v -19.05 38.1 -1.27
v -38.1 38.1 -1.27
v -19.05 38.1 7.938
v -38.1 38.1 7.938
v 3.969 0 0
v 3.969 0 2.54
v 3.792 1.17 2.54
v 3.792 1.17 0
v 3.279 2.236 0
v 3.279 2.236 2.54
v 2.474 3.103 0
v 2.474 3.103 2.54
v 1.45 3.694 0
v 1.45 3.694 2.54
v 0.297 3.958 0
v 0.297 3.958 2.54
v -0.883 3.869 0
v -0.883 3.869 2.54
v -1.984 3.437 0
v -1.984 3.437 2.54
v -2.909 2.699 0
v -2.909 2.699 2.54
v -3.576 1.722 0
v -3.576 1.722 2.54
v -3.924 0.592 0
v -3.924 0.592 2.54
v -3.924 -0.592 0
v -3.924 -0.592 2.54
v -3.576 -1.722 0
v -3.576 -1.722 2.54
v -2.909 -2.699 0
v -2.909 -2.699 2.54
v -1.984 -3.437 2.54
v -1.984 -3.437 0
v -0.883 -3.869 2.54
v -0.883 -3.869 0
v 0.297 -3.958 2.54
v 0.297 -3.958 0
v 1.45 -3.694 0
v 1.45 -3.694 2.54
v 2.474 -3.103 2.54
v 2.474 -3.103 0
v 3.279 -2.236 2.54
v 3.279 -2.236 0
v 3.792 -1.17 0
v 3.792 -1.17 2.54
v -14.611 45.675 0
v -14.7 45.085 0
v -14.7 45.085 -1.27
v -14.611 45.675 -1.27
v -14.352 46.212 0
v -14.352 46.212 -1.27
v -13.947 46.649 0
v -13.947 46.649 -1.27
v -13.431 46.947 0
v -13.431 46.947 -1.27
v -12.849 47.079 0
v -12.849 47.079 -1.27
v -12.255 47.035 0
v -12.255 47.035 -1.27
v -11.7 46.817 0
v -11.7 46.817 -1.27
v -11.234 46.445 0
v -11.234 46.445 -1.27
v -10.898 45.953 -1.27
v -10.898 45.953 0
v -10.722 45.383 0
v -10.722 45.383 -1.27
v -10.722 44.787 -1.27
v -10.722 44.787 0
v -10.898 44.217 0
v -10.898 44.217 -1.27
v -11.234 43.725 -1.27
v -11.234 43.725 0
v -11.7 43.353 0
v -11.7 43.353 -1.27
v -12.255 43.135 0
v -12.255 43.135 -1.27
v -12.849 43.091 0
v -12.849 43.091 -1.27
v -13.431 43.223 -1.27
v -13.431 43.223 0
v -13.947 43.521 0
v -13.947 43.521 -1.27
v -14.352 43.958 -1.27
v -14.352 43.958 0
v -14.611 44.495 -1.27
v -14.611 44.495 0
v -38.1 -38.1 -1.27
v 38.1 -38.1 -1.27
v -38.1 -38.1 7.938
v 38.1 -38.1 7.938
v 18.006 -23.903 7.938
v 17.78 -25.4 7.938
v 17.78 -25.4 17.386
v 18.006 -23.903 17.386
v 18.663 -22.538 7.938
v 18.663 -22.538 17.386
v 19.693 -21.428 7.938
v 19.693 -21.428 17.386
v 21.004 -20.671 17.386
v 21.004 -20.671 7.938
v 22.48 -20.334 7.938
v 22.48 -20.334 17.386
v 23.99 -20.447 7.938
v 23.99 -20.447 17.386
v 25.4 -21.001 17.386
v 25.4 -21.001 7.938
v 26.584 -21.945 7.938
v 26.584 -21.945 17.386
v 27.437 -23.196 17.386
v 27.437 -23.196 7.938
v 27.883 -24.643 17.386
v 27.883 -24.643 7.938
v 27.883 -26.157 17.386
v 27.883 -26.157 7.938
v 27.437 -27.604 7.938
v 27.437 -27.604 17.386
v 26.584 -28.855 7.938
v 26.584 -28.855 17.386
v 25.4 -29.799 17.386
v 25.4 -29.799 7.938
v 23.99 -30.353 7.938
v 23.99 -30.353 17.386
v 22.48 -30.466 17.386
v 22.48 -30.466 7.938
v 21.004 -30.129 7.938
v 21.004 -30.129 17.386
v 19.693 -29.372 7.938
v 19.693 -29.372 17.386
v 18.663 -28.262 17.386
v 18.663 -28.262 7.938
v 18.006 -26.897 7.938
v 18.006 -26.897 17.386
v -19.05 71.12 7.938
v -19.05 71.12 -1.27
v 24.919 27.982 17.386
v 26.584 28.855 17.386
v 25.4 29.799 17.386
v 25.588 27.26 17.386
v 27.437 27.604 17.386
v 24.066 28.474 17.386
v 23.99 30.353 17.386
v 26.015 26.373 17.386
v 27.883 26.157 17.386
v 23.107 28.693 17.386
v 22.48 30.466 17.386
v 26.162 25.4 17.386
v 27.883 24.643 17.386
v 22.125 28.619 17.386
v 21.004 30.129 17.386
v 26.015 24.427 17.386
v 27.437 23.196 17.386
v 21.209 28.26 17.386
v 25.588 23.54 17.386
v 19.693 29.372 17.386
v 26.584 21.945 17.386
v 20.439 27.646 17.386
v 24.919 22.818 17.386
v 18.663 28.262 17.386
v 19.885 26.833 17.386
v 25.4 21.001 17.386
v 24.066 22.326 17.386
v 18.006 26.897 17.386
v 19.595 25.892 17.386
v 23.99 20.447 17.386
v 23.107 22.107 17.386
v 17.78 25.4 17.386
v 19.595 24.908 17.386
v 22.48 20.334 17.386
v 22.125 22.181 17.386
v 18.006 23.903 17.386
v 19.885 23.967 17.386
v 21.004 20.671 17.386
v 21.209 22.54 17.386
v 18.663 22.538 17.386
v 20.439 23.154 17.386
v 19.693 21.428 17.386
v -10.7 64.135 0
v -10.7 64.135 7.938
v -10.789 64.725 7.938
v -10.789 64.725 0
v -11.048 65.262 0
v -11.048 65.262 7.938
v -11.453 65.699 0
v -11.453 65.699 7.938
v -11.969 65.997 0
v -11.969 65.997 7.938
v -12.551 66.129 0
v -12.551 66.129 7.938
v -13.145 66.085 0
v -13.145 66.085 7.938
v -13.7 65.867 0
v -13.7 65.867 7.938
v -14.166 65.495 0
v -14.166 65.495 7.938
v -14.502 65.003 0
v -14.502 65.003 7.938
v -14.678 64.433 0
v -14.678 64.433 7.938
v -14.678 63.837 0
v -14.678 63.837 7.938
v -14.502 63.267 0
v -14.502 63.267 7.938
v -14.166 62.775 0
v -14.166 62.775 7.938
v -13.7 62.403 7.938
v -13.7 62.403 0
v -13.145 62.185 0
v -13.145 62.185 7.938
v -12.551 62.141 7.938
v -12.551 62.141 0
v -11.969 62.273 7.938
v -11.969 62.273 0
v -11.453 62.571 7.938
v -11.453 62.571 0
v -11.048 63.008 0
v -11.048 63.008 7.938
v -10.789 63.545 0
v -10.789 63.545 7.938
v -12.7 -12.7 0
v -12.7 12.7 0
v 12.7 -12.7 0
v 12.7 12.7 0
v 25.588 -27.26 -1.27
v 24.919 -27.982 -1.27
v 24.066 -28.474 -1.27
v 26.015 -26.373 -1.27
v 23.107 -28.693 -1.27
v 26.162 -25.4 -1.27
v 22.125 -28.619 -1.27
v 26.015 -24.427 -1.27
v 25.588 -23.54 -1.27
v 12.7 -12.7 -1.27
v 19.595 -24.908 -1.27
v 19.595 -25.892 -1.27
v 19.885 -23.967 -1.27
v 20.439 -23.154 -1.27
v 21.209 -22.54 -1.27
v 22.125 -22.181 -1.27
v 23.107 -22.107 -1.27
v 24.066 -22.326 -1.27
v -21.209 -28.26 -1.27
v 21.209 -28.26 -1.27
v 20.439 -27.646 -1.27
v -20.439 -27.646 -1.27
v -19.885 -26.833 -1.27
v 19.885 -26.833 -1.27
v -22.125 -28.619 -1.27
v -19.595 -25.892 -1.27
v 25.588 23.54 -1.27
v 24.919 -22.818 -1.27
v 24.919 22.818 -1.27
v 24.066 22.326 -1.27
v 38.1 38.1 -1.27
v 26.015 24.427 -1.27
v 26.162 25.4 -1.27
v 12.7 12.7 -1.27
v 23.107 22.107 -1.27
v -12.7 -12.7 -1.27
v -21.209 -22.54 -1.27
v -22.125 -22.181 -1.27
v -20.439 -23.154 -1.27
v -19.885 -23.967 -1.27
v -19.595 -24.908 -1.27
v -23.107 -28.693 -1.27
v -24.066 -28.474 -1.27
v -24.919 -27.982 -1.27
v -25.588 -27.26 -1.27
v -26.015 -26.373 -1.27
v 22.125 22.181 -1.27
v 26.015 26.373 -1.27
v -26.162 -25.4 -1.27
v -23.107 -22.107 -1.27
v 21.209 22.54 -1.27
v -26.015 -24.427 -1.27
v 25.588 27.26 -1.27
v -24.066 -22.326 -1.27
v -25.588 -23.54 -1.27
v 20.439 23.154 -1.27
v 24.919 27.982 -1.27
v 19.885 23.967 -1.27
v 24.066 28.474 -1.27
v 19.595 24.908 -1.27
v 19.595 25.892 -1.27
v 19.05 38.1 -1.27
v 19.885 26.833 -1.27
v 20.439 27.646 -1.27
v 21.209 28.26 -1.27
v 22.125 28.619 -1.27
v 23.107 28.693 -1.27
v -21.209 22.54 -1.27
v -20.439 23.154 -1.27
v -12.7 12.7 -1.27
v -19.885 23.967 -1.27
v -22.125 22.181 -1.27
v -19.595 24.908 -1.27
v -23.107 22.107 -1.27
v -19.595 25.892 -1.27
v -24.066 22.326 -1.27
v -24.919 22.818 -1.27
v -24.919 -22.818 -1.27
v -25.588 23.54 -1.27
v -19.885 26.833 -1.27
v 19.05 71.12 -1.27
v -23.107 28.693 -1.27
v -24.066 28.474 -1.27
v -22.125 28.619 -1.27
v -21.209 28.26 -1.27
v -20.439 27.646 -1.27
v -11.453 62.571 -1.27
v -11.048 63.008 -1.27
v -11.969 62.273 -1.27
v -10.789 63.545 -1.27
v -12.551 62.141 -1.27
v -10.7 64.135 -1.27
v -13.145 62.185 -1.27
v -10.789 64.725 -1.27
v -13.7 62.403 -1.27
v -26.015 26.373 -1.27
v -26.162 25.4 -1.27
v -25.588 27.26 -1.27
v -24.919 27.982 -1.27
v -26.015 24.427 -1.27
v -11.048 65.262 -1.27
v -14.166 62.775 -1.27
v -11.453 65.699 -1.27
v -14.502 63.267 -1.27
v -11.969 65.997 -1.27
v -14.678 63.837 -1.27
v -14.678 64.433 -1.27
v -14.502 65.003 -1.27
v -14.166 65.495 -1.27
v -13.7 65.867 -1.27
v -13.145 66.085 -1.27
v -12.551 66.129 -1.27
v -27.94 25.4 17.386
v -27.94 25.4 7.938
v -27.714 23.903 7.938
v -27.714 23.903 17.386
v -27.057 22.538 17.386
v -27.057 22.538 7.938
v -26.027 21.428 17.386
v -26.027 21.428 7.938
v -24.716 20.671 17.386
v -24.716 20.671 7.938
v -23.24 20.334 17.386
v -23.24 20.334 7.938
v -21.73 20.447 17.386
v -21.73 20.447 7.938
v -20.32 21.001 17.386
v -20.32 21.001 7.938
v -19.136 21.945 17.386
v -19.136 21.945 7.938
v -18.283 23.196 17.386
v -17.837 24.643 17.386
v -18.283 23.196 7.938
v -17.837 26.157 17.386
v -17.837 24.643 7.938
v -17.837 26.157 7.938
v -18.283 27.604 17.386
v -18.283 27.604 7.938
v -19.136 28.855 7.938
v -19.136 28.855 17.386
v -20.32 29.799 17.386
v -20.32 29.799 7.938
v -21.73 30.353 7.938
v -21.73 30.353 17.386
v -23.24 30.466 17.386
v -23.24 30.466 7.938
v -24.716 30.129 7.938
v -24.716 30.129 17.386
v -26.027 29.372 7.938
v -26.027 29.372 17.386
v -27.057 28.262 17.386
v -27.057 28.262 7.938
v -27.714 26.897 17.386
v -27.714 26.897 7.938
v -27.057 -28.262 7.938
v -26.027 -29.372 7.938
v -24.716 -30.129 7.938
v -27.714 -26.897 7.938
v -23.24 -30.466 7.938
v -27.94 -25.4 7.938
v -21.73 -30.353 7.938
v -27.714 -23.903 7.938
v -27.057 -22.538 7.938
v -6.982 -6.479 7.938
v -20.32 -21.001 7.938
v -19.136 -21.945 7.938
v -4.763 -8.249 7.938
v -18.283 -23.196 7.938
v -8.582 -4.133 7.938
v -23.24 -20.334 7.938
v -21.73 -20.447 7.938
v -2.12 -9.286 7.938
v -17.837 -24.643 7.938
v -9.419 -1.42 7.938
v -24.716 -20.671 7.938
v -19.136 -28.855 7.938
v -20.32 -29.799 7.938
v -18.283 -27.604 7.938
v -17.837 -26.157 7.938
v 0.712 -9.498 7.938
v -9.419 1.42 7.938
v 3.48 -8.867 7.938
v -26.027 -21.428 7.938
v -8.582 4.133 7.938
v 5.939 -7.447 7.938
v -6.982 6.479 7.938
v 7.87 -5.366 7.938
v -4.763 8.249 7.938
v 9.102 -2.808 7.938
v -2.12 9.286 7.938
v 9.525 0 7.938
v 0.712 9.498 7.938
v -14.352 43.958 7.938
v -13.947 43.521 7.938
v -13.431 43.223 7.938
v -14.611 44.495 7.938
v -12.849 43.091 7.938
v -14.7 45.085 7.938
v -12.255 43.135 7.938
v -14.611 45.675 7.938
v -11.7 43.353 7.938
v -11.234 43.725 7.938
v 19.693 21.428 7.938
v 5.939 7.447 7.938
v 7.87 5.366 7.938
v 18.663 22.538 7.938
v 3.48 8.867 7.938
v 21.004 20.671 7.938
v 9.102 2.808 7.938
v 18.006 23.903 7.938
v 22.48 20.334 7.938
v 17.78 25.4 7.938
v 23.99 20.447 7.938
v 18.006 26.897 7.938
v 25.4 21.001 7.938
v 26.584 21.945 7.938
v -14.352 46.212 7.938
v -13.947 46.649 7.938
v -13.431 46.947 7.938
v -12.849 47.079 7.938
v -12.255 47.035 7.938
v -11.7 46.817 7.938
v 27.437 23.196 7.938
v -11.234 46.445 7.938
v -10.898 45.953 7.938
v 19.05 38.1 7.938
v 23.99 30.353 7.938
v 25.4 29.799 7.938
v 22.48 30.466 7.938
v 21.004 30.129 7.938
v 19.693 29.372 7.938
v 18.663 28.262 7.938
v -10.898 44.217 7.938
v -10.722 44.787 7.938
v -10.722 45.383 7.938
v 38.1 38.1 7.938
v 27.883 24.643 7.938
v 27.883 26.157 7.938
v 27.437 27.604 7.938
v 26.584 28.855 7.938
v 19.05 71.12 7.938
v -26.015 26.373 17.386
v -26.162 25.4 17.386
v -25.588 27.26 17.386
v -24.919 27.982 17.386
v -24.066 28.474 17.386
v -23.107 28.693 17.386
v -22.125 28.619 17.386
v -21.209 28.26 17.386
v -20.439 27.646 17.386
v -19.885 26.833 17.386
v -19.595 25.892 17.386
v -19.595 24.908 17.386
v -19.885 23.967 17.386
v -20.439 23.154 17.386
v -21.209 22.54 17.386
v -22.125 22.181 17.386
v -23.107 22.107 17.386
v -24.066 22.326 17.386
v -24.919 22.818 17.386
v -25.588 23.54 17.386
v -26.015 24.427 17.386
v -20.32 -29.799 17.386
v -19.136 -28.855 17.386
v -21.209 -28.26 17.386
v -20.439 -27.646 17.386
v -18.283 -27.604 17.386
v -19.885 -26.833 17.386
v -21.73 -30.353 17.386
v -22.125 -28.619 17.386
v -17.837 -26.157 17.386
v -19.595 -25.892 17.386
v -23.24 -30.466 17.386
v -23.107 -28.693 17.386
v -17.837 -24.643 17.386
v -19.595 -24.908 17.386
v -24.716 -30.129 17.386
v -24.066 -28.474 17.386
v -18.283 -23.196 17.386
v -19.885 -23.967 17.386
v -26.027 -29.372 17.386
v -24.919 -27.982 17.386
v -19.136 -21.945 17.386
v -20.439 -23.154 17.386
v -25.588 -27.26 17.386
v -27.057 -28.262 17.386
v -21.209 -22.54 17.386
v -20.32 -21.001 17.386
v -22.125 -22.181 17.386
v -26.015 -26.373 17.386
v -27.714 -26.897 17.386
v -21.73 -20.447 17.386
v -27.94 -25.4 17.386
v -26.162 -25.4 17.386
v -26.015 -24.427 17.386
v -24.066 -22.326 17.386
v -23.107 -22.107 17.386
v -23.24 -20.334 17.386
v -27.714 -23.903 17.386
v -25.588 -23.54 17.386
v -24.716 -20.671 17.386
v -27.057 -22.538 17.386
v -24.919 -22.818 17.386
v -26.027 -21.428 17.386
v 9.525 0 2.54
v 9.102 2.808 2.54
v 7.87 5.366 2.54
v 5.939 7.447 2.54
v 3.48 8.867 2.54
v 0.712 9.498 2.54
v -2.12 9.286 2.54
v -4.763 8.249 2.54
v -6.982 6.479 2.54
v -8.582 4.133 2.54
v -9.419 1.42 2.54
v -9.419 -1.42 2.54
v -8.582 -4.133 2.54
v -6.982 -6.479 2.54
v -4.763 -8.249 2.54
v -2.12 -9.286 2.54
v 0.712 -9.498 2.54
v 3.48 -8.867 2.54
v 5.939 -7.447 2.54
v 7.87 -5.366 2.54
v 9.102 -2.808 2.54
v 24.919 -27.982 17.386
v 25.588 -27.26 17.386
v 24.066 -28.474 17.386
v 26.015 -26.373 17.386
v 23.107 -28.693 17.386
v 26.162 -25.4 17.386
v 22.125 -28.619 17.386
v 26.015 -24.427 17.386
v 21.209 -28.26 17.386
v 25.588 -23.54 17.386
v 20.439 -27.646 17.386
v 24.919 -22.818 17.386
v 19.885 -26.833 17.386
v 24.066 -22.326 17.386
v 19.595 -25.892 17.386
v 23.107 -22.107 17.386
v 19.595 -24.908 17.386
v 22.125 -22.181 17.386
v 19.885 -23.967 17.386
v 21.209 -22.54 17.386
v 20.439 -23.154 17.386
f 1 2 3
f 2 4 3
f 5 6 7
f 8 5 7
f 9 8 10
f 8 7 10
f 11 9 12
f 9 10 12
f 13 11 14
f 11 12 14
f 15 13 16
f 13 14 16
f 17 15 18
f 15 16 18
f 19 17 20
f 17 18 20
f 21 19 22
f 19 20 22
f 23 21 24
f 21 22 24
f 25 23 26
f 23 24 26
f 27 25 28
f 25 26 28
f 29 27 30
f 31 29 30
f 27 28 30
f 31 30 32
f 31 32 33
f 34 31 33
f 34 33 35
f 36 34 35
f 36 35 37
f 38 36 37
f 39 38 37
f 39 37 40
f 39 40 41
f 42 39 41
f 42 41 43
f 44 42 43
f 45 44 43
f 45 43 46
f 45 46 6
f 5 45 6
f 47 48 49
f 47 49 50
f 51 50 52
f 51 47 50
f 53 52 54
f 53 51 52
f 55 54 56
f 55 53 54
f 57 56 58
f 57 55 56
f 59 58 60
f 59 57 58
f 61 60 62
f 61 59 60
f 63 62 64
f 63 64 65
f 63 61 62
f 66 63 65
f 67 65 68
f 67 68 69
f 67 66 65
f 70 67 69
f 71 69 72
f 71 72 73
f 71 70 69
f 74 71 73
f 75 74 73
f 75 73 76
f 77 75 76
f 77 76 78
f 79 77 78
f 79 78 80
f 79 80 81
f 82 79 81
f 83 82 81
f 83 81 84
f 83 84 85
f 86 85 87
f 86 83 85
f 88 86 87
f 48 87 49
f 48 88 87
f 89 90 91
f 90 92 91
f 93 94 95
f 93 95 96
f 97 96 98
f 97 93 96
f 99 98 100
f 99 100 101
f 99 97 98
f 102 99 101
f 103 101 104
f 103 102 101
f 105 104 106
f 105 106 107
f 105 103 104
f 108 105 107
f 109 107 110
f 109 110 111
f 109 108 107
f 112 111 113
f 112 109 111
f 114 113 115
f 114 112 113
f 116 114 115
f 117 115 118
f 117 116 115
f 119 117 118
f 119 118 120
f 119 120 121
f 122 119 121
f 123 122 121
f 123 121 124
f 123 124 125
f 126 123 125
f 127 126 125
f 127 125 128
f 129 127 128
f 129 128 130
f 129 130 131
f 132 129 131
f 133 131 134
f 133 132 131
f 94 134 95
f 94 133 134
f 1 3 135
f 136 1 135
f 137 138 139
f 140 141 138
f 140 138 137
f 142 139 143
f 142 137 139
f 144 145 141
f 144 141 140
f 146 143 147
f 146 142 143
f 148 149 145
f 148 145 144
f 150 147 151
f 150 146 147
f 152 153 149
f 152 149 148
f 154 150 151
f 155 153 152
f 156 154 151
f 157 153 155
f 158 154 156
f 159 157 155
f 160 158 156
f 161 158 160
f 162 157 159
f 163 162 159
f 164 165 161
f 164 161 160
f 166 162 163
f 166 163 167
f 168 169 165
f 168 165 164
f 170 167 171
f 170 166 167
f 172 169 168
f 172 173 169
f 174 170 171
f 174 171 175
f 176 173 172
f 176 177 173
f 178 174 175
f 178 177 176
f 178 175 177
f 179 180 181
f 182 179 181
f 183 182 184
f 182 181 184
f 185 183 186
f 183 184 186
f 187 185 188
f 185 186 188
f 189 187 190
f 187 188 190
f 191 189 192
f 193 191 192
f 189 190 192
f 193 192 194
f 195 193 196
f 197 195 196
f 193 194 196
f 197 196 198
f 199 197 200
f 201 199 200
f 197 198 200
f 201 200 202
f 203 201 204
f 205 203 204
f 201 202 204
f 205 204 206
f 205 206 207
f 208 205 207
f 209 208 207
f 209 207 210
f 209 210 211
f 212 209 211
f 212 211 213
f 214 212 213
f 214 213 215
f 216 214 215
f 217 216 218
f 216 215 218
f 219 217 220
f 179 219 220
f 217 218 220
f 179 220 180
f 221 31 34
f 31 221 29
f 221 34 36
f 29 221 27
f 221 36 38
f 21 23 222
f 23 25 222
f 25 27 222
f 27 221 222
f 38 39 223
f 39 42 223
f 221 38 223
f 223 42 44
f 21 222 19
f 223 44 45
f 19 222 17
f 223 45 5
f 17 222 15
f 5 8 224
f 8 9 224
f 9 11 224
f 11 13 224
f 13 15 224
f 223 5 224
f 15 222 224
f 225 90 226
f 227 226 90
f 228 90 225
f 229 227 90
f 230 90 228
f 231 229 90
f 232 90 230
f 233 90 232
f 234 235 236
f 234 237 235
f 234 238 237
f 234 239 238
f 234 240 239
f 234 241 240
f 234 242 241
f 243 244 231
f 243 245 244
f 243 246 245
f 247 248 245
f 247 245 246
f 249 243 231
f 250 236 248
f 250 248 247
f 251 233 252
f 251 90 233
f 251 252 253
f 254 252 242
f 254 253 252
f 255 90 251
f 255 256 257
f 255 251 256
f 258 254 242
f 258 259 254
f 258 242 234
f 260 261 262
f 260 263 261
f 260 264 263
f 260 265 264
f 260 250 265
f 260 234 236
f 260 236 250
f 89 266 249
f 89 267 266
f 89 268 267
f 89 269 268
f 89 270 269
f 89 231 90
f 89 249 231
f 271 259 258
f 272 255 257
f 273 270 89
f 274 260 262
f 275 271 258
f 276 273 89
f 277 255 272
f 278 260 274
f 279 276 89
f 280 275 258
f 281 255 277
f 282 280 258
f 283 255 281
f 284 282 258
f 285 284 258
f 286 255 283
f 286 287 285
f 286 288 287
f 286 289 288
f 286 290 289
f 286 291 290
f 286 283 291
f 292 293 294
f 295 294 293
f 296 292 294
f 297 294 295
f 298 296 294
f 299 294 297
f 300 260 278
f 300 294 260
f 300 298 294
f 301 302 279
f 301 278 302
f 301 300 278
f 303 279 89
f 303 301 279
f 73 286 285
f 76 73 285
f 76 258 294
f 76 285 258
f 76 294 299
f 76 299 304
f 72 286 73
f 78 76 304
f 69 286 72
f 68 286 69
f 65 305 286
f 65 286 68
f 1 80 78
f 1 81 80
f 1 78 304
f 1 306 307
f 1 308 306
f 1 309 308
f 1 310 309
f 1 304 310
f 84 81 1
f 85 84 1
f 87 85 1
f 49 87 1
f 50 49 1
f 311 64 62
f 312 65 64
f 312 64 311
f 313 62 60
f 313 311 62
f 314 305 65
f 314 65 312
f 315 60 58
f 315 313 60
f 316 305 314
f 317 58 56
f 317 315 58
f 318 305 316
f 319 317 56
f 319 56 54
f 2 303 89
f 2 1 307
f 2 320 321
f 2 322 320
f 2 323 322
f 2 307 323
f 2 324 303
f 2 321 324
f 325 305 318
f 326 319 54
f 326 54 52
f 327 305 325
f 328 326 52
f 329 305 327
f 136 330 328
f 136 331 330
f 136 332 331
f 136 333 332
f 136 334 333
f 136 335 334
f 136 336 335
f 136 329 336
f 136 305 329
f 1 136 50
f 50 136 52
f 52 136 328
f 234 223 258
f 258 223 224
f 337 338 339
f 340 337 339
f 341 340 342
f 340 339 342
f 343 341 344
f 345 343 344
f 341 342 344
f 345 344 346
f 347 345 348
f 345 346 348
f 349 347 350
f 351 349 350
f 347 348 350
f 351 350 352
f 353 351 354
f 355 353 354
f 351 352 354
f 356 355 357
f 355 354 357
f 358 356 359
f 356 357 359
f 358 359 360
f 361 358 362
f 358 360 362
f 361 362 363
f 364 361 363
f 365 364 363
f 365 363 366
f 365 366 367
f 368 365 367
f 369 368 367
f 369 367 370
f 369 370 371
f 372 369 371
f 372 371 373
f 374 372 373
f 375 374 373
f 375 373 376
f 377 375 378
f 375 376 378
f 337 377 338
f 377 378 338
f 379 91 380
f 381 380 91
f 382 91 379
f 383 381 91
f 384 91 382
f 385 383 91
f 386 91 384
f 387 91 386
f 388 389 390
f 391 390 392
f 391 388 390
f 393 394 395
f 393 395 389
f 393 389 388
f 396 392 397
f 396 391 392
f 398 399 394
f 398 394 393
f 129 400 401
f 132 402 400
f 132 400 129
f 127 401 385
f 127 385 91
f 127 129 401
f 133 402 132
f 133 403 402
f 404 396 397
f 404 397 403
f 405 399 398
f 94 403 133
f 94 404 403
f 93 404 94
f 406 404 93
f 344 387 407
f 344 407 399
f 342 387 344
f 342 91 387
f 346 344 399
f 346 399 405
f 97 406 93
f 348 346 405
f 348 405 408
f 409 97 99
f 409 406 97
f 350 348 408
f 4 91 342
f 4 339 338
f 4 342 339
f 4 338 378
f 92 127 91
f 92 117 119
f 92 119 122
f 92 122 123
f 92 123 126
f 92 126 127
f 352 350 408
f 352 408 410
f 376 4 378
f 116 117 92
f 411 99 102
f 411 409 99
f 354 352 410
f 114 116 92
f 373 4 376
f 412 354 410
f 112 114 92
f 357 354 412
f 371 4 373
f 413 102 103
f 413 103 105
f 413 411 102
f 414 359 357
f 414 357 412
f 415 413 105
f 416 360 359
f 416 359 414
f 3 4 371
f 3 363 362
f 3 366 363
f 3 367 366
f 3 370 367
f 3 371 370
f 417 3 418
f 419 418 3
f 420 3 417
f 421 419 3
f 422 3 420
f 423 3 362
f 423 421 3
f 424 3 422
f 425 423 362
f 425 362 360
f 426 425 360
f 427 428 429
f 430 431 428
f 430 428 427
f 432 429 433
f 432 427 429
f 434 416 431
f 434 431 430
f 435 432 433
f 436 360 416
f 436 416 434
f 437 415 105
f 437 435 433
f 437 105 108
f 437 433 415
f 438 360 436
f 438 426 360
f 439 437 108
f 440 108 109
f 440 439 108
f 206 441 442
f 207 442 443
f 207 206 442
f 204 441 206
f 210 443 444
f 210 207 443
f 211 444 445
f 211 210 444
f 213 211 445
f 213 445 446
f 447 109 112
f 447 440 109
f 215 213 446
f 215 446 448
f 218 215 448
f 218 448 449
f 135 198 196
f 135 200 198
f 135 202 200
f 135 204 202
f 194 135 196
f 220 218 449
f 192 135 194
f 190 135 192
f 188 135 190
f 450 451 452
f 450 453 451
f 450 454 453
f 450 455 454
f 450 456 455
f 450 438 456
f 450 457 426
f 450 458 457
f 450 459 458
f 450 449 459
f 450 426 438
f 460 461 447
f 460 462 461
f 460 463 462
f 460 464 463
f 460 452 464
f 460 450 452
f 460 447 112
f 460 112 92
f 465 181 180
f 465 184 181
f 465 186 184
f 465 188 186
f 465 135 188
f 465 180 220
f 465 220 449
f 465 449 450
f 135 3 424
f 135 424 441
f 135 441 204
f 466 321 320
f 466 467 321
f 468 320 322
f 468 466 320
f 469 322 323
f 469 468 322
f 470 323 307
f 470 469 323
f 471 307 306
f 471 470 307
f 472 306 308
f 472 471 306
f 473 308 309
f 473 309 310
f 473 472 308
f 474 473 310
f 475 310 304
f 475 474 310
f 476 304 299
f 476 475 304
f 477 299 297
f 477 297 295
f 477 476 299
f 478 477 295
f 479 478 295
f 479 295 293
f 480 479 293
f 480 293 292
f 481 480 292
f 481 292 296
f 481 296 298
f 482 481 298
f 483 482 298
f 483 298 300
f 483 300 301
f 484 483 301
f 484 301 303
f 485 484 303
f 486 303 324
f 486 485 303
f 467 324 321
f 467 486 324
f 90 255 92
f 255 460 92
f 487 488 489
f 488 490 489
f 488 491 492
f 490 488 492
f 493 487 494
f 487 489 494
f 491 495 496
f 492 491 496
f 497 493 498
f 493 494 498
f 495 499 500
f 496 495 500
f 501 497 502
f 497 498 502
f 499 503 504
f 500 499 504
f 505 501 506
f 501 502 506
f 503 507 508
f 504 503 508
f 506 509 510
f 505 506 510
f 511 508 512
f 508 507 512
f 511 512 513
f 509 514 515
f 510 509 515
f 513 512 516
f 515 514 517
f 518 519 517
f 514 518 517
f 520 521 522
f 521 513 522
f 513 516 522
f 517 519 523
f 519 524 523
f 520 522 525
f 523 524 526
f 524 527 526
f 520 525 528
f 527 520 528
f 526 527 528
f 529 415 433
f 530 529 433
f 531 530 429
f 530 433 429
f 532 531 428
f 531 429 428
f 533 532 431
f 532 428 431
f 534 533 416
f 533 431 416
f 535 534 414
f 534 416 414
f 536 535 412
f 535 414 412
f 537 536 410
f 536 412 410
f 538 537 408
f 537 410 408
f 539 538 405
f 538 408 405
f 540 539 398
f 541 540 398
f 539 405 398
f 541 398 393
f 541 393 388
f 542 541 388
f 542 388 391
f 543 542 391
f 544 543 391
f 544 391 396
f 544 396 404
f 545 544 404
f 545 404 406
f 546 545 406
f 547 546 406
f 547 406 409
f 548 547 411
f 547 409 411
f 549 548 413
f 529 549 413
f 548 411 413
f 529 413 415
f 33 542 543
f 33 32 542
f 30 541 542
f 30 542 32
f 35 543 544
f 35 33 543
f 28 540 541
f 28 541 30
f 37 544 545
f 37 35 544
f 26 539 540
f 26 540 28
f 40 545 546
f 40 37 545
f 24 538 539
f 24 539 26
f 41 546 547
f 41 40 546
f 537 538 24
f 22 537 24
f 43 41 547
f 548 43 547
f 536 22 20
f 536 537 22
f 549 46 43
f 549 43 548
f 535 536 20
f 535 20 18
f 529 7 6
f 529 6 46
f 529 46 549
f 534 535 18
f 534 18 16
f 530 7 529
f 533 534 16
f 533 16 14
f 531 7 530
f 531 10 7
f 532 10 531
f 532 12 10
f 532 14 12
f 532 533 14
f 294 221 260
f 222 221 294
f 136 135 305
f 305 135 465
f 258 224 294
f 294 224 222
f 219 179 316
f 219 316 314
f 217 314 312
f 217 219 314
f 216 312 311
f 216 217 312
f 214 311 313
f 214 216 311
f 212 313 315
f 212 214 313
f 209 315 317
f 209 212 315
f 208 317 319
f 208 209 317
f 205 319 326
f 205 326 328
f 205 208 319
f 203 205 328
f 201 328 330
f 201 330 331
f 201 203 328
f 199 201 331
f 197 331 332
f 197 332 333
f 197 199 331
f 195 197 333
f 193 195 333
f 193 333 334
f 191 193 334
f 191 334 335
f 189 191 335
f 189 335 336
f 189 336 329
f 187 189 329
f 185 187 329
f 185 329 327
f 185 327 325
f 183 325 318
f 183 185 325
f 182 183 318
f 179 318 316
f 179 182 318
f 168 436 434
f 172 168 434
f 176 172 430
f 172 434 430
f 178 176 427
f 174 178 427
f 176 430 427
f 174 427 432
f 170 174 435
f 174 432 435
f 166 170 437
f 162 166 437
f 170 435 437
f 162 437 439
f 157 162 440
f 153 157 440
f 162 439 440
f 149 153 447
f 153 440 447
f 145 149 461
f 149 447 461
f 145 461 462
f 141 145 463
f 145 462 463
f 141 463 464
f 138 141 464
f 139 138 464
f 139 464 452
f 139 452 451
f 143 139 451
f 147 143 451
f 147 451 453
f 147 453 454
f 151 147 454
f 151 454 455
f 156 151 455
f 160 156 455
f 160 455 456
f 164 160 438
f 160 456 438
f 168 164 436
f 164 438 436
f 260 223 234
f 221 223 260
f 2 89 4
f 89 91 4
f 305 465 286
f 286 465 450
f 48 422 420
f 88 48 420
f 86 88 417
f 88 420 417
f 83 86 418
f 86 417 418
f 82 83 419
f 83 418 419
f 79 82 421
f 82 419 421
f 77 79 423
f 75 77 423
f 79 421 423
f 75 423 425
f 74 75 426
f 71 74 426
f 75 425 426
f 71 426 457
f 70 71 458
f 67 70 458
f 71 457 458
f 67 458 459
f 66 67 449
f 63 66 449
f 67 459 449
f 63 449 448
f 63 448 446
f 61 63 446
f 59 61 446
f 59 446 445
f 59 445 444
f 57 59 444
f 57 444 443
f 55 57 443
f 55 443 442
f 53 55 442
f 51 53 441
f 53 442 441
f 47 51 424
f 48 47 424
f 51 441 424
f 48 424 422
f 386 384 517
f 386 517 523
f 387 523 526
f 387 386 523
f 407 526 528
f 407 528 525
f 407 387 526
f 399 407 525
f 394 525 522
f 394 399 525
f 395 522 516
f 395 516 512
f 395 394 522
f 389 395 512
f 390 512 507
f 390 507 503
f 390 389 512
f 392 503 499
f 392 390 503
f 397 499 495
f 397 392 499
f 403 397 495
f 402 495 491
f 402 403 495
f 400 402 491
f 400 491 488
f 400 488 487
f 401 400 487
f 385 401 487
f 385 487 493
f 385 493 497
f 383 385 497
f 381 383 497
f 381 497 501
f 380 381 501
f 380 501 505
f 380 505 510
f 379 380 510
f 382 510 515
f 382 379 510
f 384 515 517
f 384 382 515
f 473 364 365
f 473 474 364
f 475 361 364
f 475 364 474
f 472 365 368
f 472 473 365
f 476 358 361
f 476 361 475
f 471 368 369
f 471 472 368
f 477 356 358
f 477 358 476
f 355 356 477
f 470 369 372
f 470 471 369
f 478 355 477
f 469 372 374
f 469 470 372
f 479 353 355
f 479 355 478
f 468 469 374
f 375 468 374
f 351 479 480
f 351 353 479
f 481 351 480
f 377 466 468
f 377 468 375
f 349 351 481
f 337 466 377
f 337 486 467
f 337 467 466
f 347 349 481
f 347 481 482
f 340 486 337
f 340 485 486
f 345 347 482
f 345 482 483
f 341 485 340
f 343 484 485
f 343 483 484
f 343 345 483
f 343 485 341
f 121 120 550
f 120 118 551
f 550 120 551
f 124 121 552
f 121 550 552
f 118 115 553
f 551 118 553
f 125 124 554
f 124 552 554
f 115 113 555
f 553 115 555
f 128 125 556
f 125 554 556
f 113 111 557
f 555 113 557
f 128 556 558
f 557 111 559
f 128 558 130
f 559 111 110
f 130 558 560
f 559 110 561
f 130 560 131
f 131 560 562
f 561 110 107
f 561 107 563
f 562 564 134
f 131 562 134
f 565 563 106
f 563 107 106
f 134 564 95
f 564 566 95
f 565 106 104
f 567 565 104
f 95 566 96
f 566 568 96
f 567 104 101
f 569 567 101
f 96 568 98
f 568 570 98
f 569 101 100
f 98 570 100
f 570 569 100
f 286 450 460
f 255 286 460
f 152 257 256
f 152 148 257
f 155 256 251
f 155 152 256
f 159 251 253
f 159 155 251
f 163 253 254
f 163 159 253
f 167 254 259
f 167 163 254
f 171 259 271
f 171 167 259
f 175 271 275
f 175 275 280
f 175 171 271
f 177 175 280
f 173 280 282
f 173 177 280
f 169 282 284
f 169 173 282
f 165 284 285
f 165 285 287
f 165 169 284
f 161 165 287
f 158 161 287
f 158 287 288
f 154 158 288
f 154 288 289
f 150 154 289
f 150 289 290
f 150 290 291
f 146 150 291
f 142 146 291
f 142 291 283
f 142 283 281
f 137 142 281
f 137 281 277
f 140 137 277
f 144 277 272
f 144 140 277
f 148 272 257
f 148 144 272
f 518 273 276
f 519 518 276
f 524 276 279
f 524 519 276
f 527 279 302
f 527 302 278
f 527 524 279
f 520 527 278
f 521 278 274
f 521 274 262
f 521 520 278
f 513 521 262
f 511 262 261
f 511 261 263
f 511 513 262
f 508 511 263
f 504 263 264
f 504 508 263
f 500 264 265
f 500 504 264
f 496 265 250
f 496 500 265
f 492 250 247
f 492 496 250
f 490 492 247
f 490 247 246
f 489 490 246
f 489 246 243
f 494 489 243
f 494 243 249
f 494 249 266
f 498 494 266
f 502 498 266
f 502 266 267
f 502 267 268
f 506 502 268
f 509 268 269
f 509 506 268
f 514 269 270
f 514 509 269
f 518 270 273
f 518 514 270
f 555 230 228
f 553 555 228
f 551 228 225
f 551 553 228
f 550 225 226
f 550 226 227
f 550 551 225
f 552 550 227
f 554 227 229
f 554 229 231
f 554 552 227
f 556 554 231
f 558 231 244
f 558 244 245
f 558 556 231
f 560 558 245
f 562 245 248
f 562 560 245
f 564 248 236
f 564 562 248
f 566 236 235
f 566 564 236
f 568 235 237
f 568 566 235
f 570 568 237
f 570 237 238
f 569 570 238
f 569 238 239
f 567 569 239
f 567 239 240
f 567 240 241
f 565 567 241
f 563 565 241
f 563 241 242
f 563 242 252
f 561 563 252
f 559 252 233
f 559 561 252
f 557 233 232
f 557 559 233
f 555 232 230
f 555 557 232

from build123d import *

# Parameters (mm, degrees)
SKETCH1_W           = 38.1
SKETCH1_H           = 76.2
BOSS_EXTRUDE1_DEPTH = 7.9375
SKETCH2_R           = 3.96875
CUT_EXTRUDE1_DEPTH  = 44.330317403
SKETCH4_R           = 9.525
CUT_EXTRUDE2_DEPTH  = 5.3975
SKETCH8_W           = 19.05
SKETCH8_H           = 76.2
BOSS_EXTRUDE5_DEPTH = 7.9375
SKETCH5_R           = 5.08
BOSS_EXTRUDE2_DEPTH = 9.4488
SKETCH6_R           = 3.302
CUT_EXTRUDE3_DEPTH  = 57.617165486
SKETCH7_W           = 38.1
SKETCH7_H           = 33.02
SKETCH7_R           = 2
BOSS_EXTRUDE4_DEPTH = 7.9375
SKETCH9_R           = 3.302
SKETCH9_R_2         = 2
SKETCH9_W           = 25.4
SKETCH9_H           = 25.4
BOSS_EXTRUDE6_DEPTH = 1.27


with BuildPart() as part:
    # Sketch1 → Boss-Extrude1 (new body)
    with BuildSketch(Plane.XY):
        Rectangle(SKETCH1_W, SKETCH1_H)
    extrude(amount=BOSS_EXTRUDE1_DEPTH)

    # Sketch2 → Cut-Extrude1 (cut, through all)
    with BuildSketch(Plane.XY.offset(7.9375)):
        Circle(SKETCH2_R)
    extrude(amount=-CUT_EXTRUDE1_DEPTH, mode=Mode.SUBTRACT)

    # Sketch4 → Cut-Extrude2 (cut)
    with BuildSketch(Plane.XY.offset(7.9375)):
        Circle(SKETCH4_R)
    extrude(amount=-CUT_EXTRUDE2_DEPTH, mode=Mode.SUBTRACT)

    # Sketch8 → Boss-Extrude5 (add)
    with BuildSketch(Plane.XY.offset(7.9375)):
        with Locations((-28.575, 0)):
            Rectangle(SKETCH8_W, SKETCH8_H)
        with Locations((28.575, 0)):
            Rectangle(SKETCH8_W, SKETCH8_H)
    extrude(amount=-BOSS_EXTRUDE5_DEPTH)

    # Sketch5 → Boss-Extrude2 (add)
    with BuildSketch(Plane.XY.offset(7.9375)):
        with Locations(Location((22.86, 25.4, 0), (0, 0, 180))):
            Circle(SKETCH5_R)
        with Locations(Location((-22.86, 25.4, 0), (0, 0, 180))):
            Circle(SKETCH5_R)
    boss_extrude2 = extrude(amount=BOSS_EXTRUDE2_DEPTH)

    # Sketch6 → Cut-Extrude3 (cut, through all)
    with BuildSketch(Plane.XY.offset(17.3863)):
        with Locations((22.86, 25.4)):
            Circle(SKETCH6_R)
        with Locations(Location((-22.86, 25.4, 0), (0, 0, 180))):
            Circle(SKETCH6_R)
    cut_extrude3 = extrude(amount=-CUT_EXTRUDE3_DEPTH, mode=Mode.SUBTRACT)

    # Mirror1: Boss-Extrude2, Cut-Extrude3 across plane
    add(boss_extrude2.mirror(Plane.ZX))
    add(cut_extrude3.mirror(Plane.ZX), mode=Mode.SUBTRACT)

    # Sketch7 → Boss-Extrude4 (add)
    with BuildSketch(Plane.XY.offset(7.9375)):
        with Locations((0, 54.61)):
            Rectangle(SKETCH7_W, SKETCH7_H)
        with Locations((-12.7, 64.135)):
            Circle(SKETCH7_R, mode=Mode.SUBTRACT)
        with Locations(Location((-12.7, 45.085, 0), (0, 0, 180))):
            Circle(SKETCH7_R, mode=Mode.SUBTRACT)
    extrude(amount=-BOSS_EXTRUDE4_DEPTH)

    # Sketch9 → Boss-Extrude6 (add)
    with BuildSketch(Plane(origin=(0, 0, 0), x_dir=(-1, 0, 0), z_dir=(0, 0, -1))):
        Polygon((-19.05, 38.1), (-38.1, 38.1), (-38.1, -38.1), (38.1, -38.1), (38.1, 38.1), (19.05, 38.1), (19.05, 71.12), (-19.05, 71.12), align=None)
        with Locations(Location((-22.86, -25.4, 0), (0, 0, 180))):
            Circle(SKETCH9_R, mode=Mode.SUBTRACT)
        with Locations((22.86, -25.4)):
            Circle(SKETCH9_R, mode=Mode.SUBTRACT)
        with Locations((22.86, 25.4)):
            Circle(SKETCH9_R, mode=Mode.SUBTRACT)
        with Locations(Location((12.7, 64.135, 0), (0, 0, 180))):
            Circle(SKETCH9_R_2, mode=Mode.SUBTRACT)
        with Locations((12.7, 45.085)):
            Circle(SKETCH9_R_2, mode=Mode.SUBTRACT)
        with Locations(Location((-22.86, 25.4, 0), (0, 0, 180))):
            Circle(SKETCH9_R, mode=Mode.SUBTRACT)
        Rectangle(SKETCH9_W, SKETCH9_H, mode=Mode.SUBTRACT)
    extrude(amount=BOSS_EXTRUDE6_DEPTH)


solid = part.part
